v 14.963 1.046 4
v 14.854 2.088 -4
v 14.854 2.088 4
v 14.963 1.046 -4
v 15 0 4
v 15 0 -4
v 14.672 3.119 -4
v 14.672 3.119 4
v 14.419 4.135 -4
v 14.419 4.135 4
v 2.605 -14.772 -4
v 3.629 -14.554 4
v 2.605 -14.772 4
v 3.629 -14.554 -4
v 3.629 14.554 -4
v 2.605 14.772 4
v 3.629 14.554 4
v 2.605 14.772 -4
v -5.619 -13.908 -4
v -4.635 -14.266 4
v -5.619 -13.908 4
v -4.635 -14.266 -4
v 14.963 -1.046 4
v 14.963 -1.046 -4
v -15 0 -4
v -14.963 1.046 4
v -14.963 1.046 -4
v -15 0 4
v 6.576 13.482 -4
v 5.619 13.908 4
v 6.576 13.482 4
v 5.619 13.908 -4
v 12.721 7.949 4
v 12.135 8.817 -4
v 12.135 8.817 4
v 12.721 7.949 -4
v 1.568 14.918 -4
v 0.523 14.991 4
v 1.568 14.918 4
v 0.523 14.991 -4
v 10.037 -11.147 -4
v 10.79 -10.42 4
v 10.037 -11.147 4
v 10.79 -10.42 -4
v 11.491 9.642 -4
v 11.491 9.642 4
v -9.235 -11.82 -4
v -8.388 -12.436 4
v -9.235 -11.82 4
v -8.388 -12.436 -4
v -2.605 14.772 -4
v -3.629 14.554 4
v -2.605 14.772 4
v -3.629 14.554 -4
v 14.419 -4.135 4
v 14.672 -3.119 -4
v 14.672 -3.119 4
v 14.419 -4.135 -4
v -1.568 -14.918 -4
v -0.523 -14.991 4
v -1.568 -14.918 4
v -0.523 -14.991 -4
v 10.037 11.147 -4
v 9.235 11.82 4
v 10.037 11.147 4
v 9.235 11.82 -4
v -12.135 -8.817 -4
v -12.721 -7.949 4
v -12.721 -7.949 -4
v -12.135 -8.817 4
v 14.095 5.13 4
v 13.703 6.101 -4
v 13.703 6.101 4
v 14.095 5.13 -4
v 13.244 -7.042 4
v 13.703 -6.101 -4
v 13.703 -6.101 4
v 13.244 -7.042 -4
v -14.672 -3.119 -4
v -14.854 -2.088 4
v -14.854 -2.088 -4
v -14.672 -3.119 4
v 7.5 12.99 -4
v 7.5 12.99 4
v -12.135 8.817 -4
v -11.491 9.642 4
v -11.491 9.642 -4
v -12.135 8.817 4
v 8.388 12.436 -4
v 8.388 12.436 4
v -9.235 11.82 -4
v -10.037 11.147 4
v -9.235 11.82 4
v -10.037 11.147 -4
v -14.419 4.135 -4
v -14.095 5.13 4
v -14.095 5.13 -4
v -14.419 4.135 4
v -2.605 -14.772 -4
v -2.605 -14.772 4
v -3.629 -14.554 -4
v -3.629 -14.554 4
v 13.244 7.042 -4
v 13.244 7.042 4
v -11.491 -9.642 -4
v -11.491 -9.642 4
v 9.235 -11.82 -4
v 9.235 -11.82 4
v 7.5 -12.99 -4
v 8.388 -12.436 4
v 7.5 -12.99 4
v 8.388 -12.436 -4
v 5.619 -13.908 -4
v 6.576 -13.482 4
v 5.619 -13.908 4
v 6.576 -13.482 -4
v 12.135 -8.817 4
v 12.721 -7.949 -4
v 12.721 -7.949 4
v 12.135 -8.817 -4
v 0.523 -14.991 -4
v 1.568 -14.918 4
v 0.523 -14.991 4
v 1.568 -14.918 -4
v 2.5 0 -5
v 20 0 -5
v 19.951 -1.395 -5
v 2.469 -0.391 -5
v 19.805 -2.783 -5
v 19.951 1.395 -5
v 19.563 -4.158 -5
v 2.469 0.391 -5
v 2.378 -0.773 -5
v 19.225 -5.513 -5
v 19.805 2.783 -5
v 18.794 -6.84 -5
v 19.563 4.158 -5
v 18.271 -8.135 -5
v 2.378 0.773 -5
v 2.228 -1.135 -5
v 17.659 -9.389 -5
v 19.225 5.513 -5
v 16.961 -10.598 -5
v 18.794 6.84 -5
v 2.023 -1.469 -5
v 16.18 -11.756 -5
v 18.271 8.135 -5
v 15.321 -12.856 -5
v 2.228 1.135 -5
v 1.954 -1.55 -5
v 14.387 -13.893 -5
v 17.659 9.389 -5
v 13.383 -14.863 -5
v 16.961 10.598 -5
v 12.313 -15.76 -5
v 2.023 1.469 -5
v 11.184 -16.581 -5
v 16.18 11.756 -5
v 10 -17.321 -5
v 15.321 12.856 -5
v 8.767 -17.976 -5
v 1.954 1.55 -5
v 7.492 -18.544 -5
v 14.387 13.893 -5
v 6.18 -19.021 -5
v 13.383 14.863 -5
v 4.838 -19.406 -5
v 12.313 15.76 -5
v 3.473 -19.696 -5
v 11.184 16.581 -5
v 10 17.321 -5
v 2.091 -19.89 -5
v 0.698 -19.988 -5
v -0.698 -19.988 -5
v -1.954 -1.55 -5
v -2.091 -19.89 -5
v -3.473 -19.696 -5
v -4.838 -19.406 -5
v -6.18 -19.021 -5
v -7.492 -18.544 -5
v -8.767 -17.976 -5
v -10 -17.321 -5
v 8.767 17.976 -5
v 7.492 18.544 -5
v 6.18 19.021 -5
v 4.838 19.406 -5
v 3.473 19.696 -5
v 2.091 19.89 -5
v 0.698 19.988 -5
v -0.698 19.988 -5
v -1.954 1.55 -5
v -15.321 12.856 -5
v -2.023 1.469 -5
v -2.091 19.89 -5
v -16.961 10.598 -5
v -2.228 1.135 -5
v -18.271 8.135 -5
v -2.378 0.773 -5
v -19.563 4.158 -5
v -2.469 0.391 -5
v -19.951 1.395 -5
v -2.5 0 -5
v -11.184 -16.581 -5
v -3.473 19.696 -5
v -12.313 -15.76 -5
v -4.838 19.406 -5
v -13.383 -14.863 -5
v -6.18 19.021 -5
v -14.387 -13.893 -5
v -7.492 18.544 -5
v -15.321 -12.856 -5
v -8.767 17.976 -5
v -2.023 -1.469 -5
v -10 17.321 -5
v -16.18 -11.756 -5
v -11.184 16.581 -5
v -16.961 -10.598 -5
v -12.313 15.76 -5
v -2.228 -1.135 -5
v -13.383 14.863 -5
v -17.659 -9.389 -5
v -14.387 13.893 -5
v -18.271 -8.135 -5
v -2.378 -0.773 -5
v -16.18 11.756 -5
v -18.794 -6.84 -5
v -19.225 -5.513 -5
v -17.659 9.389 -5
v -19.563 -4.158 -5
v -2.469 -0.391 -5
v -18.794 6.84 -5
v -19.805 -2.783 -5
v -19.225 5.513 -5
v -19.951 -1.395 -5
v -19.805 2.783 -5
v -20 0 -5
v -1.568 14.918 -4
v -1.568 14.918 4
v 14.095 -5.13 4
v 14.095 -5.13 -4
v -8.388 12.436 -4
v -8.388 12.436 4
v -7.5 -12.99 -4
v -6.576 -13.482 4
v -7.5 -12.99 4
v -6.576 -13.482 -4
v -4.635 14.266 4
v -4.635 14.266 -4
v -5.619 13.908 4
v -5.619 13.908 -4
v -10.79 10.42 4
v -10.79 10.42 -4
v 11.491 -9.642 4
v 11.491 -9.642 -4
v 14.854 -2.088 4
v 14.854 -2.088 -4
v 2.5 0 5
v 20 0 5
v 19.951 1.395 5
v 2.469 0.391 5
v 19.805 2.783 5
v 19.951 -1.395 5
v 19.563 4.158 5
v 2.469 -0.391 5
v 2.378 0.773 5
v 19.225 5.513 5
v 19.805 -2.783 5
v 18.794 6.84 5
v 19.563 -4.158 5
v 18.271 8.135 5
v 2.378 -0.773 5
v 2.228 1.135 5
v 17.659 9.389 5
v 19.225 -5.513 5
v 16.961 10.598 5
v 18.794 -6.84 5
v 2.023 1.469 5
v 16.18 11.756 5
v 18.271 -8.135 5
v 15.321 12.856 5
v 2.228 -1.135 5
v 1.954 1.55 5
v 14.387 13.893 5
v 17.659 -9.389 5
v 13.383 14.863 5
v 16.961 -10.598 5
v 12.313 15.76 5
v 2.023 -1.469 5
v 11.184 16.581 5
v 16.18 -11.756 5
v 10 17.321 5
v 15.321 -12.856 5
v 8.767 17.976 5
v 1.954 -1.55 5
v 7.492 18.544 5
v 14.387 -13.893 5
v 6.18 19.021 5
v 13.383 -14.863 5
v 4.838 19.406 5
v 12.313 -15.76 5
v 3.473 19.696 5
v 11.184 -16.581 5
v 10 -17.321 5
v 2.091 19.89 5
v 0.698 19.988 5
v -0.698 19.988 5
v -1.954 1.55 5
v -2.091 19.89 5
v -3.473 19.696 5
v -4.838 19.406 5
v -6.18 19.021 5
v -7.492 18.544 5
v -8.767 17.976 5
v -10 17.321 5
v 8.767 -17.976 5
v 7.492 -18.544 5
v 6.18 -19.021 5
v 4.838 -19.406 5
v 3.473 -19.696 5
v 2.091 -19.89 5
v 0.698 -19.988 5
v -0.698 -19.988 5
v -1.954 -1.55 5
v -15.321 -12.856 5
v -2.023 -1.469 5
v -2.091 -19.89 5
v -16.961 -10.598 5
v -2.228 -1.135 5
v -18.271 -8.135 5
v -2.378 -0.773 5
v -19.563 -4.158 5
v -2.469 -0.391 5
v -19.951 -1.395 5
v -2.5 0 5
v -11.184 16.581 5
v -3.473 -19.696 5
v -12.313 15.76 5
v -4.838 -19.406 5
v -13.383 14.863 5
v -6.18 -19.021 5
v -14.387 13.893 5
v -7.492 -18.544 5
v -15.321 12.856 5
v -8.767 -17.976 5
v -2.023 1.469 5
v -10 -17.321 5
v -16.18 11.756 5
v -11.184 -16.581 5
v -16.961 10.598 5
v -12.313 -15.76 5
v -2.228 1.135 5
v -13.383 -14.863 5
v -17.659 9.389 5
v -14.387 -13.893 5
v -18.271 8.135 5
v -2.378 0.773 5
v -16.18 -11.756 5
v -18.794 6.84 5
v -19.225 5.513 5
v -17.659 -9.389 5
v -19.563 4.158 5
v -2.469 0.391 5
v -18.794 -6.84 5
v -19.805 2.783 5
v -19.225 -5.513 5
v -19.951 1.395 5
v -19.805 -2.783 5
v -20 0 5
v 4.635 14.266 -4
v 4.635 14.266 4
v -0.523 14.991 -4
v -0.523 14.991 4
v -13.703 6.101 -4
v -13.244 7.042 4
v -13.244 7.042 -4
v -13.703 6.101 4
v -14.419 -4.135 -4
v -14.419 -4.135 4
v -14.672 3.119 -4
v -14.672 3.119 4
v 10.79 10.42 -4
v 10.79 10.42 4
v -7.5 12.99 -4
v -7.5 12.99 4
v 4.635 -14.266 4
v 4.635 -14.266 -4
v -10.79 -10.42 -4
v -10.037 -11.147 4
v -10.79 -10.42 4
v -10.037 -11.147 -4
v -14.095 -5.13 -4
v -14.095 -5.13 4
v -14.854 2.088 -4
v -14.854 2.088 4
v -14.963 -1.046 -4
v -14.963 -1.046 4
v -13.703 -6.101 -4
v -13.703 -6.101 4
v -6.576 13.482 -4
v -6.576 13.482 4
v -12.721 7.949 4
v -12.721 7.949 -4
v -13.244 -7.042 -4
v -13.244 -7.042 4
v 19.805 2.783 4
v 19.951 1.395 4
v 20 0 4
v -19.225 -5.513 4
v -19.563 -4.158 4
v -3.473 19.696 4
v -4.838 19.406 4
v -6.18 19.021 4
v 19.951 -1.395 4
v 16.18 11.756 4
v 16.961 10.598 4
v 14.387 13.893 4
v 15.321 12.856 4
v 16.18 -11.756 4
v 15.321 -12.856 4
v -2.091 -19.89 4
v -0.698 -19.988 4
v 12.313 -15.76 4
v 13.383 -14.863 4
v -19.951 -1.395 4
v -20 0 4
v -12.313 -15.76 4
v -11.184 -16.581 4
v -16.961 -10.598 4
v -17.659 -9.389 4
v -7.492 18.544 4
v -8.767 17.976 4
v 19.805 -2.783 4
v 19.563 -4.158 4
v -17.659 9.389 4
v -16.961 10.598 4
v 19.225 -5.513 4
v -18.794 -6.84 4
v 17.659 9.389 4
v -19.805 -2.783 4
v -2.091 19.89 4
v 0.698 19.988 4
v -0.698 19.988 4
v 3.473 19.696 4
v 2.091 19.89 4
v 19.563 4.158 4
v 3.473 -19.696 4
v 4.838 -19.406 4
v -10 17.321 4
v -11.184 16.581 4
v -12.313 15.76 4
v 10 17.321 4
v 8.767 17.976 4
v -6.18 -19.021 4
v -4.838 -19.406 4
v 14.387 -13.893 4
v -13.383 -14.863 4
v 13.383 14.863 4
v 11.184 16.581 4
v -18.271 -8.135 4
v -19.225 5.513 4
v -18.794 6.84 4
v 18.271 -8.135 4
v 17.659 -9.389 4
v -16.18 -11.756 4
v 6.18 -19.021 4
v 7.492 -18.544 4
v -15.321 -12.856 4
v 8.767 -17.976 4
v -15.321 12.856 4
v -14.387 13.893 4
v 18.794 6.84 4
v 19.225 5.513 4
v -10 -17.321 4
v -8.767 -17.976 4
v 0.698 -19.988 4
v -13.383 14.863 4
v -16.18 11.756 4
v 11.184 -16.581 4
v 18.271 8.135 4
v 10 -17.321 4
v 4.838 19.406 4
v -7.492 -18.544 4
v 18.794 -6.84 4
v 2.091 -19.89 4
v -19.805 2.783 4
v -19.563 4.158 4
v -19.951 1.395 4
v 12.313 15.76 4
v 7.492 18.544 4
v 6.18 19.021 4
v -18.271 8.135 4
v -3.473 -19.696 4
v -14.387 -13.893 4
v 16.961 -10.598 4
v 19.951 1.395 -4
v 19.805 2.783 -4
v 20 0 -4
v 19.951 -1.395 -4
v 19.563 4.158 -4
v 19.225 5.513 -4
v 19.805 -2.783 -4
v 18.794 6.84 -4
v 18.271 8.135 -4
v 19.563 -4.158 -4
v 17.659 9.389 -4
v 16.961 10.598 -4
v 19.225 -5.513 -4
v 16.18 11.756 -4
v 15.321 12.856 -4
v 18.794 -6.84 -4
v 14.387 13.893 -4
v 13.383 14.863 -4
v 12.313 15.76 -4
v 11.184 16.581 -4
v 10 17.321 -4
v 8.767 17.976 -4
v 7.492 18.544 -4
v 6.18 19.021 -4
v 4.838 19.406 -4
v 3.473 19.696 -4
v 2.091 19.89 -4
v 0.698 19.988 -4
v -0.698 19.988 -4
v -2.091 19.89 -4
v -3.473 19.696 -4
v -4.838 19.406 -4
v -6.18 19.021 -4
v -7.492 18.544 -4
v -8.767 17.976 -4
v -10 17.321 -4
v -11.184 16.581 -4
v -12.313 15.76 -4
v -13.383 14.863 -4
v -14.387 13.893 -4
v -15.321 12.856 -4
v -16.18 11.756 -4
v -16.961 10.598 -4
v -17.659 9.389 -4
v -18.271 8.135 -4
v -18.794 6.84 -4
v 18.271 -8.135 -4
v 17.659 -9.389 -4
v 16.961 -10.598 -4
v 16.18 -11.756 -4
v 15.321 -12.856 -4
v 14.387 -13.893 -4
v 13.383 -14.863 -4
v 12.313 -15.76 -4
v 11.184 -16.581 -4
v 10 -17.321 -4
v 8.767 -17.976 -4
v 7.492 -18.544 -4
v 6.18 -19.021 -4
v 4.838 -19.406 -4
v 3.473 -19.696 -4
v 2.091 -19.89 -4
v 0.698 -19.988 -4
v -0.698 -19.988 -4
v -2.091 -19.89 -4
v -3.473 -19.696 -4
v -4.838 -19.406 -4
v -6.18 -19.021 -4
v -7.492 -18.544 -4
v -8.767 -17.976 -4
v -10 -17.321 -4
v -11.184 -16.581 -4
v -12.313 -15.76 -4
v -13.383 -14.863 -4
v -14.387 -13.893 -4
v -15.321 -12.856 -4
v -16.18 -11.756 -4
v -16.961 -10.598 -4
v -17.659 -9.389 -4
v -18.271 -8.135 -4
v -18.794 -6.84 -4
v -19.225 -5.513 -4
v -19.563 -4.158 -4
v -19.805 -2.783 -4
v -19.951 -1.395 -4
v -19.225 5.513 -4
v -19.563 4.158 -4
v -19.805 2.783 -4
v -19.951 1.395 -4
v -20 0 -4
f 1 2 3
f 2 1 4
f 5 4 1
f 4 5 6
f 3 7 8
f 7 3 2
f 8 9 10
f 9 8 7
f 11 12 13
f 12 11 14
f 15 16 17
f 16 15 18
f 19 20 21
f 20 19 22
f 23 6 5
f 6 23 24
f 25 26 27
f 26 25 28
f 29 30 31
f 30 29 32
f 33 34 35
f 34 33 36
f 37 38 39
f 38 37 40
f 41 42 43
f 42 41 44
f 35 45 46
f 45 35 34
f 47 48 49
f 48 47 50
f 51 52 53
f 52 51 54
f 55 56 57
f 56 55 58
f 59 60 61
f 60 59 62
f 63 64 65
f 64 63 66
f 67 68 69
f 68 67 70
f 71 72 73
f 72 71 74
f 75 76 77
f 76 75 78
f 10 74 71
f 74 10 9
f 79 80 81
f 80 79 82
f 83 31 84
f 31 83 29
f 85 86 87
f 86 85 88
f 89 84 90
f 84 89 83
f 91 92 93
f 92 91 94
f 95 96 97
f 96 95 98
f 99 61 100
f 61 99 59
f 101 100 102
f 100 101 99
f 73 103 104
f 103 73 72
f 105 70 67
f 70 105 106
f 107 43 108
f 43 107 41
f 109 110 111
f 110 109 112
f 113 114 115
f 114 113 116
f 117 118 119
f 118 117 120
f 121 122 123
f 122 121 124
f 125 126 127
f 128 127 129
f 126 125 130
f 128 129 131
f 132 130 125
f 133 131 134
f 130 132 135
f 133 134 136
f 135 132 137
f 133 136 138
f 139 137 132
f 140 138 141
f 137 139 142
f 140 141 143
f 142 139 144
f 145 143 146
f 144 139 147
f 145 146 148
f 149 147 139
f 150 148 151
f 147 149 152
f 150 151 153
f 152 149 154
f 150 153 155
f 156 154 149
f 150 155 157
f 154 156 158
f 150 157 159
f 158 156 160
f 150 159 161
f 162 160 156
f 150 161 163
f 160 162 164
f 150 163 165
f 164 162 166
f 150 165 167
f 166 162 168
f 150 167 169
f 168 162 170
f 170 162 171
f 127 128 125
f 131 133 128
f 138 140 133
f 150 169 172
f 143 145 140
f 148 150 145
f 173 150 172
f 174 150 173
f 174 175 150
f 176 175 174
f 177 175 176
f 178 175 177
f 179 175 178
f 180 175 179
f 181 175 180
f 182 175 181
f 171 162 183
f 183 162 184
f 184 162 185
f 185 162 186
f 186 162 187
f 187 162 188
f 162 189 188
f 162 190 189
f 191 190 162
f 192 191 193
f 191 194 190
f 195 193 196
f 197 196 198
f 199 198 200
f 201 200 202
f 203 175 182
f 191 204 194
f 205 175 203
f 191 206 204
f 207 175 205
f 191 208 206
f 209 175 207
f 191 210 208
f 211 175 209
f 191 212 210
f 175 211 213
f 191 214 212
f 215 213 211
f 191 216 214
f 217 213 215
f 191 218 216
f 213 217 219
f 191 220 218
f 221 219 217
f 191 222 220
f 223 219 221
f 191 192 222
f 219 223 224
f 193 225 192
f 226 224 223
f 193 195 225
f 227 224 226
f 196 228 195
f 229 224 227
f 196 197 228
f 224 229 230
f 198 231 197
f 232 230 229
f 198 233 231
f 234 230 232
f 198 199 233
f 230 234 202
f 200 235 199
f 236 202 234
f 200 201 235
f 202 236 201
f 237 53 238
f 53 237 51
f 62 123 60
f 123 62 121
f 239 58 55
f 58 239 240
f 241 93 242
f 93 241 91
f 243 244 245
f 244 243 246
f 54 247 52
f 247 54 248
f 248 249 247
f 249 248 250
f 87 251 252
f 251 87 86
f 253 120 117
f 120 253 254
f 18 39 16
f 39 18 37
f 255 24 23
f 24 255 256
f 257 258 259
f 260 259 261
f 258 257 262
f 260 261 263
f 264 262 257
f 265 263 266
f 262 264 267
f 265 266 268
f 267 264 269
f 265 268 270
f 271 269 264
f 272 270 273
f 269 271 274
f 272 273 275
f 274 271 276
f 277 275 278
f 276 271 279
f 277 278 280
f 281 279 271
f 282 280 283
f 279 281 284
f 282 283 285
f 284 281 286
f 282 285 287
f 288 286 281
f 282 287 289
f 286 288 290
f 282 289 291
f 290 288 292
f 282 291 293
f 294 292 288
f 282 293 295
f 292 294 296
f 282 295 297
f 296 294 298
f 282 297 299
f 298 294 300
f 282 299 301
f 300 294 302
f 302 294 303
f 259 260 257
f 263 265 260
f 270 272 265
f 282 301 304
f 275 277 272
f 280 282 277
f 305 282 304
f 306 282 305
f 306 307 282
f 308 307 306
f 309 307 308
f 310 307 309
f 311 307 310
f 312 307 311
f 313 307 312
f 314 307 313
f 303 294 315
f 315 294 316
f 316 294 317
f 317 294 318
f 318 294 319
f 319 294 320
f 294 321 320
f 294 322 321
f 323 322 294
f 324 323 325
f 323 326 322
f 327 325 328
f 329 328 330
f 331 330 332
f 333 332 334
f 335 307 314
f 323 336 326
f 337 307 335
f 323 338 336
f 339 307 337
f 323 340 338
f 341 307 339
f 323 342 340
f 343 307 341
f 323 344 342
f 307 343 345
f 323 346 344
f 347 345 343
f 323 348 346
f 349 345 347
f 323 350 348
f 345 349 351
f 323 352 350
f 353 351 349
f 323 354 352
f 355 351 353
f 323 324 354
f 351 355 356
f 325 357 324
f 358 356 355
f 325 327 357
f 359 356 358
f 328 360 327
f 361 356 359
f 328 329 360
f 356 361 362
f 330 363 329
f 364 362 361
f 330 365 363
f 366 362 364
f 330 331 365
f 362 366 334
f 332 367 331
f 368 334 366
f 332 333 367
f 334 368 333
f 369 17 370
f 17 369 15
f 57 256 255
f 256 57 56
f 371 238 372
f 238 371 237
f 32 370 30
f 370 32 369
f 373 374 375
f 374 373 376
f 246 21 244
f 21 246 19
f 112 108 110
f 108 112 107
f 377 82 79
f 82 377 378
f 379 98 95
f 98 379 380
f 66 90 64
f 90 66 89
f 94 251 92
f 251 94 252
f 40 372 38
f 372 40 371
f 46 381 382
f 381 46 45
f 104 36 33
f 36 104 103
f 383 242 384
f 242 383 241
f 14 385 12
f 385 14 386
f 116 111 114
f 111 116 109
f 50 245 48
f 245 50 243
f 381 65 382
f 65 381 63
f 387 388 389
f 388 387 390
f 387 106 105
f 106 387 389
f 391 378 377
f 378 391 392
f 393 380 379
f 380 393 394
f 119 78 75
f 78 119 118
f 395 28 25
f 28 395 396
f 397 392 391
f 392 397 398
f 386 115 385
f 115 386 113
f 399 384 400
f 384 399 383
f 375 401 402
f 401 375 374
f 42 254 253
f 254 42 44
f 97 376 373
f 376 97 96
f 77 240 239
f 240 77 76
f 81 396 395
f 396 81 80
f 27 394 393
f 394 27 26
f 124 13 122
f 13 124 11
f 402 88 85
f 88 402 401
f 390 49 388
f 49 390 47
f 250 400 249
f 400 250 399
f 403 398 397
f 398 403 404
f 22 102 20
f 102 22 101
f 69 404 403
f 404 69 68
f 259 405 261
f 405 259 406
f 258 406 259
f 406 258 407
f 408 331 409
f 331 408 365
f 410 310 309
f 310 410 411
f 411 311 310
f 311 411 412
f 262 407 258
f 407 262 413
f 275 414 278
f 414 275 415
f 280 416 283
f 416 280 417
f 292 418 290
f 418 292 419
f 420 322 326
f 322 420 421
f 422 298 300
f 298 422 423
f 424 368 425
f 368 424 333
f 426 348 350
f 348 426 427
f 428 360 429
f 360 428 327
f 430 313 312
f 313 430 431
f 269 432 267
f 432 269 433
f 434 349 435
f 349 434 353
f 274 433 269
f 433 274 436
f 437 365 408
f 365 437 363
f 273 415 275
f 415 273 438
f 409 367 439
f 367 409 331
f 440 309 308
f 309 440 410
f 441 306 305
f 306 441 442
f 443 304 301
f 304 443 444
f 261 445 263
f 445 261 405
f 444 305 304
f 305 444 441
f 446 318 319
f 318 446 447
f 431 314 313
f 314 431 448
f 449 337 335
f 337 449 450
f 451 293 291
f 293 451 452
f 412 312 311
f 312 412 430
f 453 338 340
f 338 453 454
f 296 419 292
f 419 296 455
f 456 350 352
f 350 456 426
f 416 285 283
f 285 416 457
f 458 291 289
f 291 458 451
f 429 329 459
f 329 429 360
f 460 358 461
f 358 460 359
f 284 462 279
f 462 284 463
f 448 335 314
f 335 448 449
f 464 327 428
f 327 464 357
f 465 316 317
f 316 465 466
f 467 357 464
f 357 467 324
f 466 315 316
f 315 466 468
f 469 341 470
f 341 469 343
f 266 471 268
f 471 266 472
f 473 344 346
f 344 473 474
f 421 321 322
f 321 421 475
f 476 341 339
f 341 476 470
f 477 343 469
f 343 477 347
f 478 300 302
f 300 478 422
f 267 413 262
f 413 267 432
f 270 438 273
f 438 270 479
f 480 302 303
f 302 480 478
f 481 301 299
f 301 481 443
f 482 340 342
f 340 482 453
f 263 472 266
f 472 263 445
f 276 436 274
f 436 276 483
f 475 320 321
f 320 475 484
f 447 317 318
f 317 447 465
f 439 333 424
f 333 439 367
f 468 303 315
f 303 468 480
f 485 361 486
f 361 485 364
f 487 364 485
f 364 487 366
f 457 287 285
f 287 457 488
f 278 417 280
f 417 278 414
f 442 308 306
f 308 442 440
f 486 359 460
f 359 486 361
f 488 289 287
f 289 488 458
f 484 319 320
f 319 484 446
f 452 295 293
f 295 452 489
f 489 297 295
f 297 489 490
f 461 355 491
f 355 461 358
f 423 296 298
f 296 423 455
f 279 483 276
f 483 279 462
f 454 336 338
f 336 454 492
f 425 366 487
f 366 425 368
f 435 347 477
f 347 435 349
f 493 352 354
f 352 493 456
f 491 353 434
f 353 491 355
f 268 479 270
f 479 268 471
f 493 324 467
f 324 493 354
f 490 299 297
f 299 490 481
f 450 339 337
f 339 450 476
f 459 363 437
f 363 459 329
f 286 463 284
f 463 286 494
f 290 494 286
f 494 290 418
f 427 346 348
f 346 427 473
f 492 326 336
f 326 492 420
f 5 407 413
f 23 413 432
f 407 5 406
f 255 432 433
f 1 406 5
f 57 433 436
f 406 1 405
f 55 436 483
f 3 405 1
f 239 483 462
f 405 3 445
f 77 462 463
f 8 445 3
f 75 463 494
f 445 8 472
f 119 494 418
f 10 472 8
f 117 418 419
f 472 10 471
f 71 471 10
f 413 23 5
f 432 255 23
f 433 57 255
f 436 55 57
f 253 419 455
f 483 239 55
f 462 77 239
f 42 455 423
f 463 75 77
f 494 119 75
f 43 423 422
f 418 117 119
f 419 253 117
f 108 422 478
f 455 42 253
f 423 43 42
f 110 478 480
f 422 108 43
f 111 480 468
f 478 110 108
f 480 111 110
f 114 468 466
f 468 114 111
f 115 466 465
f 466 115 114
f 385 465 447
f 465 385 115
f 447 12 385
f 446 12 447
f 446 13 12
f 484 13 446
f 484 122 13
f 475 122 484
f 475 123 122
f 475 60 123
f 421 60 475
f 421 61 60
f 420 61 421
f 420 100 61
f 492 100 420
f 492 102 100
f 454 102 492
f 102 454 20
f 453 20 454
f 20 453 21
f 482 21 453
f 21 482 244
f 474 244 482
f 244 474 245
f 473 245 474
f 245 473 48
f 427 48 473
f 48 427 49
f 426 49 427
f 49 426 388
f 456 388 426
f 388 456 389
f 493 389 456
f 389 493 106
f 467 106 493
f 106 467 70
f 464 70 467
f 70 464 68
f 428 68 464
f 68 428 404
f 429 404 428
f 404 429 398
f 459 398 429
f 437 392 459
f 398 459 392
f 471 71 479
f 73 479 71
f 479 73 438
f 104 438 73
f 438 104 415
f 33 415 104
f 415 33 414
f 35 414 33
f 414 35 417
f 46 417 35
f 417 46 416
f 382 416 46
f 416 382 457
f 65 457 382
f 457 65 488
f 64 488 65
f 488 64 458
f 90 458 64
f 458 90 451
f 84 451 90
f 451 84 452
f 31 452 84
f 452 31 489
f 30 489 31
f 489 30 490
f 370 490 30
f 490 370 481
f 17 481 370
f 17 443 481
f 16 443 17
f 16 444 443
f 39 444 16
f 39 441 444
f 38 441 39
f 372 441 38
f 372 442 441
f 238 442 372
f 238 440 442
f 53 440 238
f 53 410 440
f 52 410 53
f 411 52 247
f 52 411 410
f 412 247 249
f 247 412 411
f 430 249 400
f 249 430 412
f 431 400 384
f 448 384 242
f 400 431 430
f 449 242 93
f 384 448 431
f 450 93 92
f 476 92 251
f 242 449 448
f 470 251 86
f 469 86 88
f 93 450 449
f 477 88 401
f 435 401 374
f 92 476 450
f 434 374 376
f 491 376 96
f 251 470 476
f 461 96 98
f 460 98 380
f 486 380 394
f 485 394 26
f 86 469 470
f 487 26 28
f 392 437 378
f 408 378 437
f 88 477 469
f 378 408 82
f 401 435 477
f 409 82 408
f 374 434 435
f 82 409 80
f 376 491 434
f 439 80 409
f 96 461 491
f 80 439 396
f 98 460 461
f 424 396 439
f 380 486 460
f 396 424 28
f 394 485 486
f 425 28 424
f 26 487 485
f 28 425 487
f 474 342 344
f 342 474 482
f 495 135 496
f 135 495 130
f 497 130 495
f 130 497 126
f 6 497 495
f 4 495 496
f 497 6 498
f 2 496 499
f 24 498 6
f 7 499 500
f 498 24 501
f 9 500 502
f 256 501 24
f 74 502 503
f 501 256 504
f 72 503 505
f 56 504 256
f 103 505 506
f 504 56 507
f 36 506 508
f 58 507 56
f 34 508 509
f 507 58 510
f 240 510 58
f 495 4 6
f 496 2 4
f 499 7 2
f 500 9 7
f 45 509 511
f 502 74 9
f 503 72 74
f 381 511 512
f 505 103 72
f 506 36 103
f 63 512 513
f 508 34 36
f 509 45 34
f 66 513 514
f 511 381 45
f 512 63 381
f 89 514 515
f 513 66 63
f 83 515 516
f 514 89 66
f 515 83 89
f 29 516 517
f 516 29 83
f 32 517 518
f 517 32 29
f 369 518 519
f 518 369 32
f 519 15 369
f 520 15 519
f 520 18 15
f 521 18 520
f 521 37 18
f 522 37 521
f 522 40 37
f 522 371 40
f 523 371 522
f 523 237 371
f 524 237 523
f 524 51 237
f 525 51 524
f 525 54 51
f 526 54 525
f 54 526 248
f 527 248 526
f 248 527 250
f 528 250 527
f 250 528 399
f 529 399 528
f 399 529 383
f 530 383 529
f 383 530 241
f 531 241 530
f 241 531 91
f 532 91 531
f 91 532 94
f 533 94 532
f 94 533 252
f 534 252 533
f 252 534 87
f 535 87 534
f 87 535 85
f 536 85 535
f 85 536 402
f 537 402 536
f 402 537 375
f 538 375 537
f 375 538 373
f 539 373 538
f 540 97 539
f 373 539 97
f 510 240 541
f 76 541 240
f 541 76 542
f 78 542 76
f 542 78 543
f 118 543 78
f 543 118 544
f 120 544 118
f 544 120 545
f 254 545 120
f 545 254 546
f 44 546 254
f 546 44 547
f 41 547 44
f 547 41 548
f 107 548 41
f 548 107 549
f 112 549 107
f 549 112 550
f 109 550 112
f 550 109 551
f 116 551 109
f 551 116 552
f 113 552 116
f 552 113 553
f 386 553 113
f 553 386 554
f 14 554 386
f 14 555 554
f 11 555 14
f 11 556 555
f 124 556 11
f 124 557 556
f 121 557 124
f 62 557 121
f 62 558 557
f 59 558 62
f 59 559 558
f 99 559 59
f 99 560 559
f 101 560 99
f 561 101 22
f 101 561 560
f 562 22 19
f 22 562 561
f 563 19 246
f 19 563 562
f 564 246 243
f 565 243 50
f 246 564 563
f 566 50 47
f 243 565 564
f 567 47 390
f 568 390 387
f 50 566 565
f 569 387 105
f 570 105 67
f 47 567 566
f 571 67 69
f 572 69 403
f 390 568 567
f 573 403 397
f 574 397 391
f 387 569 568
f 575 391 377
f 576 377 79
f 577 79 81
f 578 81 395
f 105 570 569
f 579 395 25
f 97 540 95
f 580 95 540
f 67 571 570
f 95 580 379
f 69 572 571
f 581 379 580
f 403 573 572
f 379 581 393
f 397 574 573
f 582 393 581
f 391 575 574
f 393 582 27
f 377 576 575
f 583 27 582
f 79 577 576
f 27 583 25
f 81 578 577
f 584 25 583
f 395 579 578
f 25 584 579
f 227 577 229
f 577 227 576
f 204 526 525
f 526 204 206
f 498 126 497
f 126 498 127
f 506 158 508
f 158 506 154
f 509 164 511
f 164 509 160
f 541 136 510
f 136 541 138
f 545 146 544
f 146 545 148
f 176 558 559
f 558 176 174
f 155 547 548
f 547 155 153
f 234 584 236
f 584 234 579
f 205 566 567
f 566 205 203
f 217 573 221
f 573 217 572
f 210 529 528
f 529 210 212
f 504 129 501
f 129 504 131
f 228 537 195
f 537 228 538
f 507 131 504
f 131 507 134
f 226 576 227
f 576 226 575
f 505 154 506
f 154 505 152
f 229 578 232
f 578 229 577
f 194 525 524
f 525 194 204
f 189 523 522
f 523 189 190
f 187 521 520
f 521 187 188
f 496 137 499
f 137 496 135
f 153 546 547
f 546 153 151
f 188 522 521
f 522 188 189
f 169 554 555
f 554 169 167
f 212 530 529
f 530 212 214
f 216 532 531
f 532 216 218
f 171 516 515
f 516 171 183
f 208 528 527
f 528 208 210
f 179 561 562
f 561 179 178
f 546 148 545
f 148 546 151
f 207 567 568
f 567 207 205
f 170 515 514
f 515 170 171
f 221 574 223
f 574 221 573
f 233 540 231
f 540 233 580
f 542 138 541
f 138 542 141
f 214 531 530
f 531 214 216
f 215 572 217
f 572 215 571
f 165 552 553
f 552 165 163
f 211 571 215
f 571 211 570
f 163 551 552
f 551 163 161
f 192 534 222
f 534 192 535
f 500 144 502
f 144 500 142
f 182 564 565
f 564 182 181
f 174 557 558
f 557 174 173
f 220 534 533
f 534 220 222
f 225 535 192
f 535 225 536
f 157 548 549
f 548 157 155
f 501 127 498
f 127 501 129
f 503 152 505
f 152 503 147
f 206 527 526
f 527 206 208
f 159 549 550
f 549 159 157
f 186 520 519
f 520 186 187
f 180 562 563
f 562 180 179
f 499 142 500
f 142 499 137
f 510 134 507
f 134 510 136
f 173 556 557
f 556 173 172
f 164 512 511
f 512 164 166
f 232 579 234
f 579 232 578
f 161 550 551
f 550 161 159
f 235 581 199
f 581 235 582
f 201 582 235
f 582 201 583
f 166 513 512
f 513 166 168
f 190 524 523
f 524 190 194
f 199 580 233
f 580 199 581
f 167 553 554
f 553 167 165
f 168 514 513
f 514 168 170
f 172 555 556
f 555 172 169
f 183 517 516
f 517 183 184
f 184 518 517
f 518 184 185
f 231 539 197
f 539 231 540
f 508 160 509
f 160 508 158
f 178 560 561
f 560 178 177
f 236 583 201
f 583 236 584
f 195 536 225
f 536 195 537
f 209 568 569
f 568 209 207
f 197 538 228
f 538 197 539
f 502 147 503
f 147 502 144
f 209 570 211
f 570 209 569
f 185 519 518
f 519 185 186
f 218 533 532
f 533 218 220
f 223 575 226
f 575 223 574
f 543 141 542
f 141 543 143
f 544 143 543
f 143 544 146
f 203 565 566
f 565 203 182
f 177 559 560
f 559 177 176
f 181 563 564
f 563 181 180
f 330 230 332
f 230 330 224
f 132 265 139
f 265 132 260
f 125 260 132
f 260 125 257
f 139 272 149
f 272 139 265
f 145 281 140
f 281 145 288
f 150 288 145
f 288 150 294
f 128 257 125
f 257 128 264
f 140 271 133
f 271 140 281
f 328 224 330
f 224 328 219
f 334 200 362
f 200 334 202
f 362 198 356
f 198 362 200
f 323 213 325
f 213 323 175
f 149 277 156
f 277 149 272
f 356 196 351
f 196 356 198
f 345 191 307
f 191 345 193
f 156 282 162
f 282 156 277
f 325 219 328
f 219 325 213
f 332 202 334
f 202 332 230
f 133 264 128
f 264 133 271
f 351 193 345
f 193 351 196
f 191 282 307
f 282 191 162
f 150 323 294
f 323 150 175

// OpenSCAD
pulley_width = 10; // mmm
pulley_axis_diameter = 5; // eg motor axis 
pilley_axis_cut = 3.1; // e.g. for stepper28BYJ
pulley_outer_diameter = 30; // outer diamter of the pulley
pulley_wall_height = 5;
pulley_wall_thickness = 1;

$fn=90;


difference() {
    union() {
        cylinder(h=pulley_width,r=(pulley_outer_diameter)/2,center=true);
        translate([0,0,(pulley_width-pulley_wall_thickness)/2]) cylinder(h=pulley_wall_thickness,r=(pulley_outer_diameter/2)+pulley_wall_height,center=true);
        translate([0,0,-(pulley_width-pulley_wall_thickness)/2]) cylinder(h=pulley_wall_thickness,r=(pulley_outer_diameter/2)+pulley_wall_height,center=true);
    }
//    axis_profile_round();
    axis_profile_28BYJ();
} 

module axis_profile_round() {
    cylinder(h=pulley_width+2,r=pulley_axis_diameter/2,center=true);
    
}

module axis_profile_28BYJ() {
        intersection() {
        cylinder(h=pulley_width+2,r=pulley_axis_diameter/2,center=true,$fn=40);
        cube([pulley_axis_diameter,pilley_axis_cut,pulley_width+2],center=true);
    }
    
}
